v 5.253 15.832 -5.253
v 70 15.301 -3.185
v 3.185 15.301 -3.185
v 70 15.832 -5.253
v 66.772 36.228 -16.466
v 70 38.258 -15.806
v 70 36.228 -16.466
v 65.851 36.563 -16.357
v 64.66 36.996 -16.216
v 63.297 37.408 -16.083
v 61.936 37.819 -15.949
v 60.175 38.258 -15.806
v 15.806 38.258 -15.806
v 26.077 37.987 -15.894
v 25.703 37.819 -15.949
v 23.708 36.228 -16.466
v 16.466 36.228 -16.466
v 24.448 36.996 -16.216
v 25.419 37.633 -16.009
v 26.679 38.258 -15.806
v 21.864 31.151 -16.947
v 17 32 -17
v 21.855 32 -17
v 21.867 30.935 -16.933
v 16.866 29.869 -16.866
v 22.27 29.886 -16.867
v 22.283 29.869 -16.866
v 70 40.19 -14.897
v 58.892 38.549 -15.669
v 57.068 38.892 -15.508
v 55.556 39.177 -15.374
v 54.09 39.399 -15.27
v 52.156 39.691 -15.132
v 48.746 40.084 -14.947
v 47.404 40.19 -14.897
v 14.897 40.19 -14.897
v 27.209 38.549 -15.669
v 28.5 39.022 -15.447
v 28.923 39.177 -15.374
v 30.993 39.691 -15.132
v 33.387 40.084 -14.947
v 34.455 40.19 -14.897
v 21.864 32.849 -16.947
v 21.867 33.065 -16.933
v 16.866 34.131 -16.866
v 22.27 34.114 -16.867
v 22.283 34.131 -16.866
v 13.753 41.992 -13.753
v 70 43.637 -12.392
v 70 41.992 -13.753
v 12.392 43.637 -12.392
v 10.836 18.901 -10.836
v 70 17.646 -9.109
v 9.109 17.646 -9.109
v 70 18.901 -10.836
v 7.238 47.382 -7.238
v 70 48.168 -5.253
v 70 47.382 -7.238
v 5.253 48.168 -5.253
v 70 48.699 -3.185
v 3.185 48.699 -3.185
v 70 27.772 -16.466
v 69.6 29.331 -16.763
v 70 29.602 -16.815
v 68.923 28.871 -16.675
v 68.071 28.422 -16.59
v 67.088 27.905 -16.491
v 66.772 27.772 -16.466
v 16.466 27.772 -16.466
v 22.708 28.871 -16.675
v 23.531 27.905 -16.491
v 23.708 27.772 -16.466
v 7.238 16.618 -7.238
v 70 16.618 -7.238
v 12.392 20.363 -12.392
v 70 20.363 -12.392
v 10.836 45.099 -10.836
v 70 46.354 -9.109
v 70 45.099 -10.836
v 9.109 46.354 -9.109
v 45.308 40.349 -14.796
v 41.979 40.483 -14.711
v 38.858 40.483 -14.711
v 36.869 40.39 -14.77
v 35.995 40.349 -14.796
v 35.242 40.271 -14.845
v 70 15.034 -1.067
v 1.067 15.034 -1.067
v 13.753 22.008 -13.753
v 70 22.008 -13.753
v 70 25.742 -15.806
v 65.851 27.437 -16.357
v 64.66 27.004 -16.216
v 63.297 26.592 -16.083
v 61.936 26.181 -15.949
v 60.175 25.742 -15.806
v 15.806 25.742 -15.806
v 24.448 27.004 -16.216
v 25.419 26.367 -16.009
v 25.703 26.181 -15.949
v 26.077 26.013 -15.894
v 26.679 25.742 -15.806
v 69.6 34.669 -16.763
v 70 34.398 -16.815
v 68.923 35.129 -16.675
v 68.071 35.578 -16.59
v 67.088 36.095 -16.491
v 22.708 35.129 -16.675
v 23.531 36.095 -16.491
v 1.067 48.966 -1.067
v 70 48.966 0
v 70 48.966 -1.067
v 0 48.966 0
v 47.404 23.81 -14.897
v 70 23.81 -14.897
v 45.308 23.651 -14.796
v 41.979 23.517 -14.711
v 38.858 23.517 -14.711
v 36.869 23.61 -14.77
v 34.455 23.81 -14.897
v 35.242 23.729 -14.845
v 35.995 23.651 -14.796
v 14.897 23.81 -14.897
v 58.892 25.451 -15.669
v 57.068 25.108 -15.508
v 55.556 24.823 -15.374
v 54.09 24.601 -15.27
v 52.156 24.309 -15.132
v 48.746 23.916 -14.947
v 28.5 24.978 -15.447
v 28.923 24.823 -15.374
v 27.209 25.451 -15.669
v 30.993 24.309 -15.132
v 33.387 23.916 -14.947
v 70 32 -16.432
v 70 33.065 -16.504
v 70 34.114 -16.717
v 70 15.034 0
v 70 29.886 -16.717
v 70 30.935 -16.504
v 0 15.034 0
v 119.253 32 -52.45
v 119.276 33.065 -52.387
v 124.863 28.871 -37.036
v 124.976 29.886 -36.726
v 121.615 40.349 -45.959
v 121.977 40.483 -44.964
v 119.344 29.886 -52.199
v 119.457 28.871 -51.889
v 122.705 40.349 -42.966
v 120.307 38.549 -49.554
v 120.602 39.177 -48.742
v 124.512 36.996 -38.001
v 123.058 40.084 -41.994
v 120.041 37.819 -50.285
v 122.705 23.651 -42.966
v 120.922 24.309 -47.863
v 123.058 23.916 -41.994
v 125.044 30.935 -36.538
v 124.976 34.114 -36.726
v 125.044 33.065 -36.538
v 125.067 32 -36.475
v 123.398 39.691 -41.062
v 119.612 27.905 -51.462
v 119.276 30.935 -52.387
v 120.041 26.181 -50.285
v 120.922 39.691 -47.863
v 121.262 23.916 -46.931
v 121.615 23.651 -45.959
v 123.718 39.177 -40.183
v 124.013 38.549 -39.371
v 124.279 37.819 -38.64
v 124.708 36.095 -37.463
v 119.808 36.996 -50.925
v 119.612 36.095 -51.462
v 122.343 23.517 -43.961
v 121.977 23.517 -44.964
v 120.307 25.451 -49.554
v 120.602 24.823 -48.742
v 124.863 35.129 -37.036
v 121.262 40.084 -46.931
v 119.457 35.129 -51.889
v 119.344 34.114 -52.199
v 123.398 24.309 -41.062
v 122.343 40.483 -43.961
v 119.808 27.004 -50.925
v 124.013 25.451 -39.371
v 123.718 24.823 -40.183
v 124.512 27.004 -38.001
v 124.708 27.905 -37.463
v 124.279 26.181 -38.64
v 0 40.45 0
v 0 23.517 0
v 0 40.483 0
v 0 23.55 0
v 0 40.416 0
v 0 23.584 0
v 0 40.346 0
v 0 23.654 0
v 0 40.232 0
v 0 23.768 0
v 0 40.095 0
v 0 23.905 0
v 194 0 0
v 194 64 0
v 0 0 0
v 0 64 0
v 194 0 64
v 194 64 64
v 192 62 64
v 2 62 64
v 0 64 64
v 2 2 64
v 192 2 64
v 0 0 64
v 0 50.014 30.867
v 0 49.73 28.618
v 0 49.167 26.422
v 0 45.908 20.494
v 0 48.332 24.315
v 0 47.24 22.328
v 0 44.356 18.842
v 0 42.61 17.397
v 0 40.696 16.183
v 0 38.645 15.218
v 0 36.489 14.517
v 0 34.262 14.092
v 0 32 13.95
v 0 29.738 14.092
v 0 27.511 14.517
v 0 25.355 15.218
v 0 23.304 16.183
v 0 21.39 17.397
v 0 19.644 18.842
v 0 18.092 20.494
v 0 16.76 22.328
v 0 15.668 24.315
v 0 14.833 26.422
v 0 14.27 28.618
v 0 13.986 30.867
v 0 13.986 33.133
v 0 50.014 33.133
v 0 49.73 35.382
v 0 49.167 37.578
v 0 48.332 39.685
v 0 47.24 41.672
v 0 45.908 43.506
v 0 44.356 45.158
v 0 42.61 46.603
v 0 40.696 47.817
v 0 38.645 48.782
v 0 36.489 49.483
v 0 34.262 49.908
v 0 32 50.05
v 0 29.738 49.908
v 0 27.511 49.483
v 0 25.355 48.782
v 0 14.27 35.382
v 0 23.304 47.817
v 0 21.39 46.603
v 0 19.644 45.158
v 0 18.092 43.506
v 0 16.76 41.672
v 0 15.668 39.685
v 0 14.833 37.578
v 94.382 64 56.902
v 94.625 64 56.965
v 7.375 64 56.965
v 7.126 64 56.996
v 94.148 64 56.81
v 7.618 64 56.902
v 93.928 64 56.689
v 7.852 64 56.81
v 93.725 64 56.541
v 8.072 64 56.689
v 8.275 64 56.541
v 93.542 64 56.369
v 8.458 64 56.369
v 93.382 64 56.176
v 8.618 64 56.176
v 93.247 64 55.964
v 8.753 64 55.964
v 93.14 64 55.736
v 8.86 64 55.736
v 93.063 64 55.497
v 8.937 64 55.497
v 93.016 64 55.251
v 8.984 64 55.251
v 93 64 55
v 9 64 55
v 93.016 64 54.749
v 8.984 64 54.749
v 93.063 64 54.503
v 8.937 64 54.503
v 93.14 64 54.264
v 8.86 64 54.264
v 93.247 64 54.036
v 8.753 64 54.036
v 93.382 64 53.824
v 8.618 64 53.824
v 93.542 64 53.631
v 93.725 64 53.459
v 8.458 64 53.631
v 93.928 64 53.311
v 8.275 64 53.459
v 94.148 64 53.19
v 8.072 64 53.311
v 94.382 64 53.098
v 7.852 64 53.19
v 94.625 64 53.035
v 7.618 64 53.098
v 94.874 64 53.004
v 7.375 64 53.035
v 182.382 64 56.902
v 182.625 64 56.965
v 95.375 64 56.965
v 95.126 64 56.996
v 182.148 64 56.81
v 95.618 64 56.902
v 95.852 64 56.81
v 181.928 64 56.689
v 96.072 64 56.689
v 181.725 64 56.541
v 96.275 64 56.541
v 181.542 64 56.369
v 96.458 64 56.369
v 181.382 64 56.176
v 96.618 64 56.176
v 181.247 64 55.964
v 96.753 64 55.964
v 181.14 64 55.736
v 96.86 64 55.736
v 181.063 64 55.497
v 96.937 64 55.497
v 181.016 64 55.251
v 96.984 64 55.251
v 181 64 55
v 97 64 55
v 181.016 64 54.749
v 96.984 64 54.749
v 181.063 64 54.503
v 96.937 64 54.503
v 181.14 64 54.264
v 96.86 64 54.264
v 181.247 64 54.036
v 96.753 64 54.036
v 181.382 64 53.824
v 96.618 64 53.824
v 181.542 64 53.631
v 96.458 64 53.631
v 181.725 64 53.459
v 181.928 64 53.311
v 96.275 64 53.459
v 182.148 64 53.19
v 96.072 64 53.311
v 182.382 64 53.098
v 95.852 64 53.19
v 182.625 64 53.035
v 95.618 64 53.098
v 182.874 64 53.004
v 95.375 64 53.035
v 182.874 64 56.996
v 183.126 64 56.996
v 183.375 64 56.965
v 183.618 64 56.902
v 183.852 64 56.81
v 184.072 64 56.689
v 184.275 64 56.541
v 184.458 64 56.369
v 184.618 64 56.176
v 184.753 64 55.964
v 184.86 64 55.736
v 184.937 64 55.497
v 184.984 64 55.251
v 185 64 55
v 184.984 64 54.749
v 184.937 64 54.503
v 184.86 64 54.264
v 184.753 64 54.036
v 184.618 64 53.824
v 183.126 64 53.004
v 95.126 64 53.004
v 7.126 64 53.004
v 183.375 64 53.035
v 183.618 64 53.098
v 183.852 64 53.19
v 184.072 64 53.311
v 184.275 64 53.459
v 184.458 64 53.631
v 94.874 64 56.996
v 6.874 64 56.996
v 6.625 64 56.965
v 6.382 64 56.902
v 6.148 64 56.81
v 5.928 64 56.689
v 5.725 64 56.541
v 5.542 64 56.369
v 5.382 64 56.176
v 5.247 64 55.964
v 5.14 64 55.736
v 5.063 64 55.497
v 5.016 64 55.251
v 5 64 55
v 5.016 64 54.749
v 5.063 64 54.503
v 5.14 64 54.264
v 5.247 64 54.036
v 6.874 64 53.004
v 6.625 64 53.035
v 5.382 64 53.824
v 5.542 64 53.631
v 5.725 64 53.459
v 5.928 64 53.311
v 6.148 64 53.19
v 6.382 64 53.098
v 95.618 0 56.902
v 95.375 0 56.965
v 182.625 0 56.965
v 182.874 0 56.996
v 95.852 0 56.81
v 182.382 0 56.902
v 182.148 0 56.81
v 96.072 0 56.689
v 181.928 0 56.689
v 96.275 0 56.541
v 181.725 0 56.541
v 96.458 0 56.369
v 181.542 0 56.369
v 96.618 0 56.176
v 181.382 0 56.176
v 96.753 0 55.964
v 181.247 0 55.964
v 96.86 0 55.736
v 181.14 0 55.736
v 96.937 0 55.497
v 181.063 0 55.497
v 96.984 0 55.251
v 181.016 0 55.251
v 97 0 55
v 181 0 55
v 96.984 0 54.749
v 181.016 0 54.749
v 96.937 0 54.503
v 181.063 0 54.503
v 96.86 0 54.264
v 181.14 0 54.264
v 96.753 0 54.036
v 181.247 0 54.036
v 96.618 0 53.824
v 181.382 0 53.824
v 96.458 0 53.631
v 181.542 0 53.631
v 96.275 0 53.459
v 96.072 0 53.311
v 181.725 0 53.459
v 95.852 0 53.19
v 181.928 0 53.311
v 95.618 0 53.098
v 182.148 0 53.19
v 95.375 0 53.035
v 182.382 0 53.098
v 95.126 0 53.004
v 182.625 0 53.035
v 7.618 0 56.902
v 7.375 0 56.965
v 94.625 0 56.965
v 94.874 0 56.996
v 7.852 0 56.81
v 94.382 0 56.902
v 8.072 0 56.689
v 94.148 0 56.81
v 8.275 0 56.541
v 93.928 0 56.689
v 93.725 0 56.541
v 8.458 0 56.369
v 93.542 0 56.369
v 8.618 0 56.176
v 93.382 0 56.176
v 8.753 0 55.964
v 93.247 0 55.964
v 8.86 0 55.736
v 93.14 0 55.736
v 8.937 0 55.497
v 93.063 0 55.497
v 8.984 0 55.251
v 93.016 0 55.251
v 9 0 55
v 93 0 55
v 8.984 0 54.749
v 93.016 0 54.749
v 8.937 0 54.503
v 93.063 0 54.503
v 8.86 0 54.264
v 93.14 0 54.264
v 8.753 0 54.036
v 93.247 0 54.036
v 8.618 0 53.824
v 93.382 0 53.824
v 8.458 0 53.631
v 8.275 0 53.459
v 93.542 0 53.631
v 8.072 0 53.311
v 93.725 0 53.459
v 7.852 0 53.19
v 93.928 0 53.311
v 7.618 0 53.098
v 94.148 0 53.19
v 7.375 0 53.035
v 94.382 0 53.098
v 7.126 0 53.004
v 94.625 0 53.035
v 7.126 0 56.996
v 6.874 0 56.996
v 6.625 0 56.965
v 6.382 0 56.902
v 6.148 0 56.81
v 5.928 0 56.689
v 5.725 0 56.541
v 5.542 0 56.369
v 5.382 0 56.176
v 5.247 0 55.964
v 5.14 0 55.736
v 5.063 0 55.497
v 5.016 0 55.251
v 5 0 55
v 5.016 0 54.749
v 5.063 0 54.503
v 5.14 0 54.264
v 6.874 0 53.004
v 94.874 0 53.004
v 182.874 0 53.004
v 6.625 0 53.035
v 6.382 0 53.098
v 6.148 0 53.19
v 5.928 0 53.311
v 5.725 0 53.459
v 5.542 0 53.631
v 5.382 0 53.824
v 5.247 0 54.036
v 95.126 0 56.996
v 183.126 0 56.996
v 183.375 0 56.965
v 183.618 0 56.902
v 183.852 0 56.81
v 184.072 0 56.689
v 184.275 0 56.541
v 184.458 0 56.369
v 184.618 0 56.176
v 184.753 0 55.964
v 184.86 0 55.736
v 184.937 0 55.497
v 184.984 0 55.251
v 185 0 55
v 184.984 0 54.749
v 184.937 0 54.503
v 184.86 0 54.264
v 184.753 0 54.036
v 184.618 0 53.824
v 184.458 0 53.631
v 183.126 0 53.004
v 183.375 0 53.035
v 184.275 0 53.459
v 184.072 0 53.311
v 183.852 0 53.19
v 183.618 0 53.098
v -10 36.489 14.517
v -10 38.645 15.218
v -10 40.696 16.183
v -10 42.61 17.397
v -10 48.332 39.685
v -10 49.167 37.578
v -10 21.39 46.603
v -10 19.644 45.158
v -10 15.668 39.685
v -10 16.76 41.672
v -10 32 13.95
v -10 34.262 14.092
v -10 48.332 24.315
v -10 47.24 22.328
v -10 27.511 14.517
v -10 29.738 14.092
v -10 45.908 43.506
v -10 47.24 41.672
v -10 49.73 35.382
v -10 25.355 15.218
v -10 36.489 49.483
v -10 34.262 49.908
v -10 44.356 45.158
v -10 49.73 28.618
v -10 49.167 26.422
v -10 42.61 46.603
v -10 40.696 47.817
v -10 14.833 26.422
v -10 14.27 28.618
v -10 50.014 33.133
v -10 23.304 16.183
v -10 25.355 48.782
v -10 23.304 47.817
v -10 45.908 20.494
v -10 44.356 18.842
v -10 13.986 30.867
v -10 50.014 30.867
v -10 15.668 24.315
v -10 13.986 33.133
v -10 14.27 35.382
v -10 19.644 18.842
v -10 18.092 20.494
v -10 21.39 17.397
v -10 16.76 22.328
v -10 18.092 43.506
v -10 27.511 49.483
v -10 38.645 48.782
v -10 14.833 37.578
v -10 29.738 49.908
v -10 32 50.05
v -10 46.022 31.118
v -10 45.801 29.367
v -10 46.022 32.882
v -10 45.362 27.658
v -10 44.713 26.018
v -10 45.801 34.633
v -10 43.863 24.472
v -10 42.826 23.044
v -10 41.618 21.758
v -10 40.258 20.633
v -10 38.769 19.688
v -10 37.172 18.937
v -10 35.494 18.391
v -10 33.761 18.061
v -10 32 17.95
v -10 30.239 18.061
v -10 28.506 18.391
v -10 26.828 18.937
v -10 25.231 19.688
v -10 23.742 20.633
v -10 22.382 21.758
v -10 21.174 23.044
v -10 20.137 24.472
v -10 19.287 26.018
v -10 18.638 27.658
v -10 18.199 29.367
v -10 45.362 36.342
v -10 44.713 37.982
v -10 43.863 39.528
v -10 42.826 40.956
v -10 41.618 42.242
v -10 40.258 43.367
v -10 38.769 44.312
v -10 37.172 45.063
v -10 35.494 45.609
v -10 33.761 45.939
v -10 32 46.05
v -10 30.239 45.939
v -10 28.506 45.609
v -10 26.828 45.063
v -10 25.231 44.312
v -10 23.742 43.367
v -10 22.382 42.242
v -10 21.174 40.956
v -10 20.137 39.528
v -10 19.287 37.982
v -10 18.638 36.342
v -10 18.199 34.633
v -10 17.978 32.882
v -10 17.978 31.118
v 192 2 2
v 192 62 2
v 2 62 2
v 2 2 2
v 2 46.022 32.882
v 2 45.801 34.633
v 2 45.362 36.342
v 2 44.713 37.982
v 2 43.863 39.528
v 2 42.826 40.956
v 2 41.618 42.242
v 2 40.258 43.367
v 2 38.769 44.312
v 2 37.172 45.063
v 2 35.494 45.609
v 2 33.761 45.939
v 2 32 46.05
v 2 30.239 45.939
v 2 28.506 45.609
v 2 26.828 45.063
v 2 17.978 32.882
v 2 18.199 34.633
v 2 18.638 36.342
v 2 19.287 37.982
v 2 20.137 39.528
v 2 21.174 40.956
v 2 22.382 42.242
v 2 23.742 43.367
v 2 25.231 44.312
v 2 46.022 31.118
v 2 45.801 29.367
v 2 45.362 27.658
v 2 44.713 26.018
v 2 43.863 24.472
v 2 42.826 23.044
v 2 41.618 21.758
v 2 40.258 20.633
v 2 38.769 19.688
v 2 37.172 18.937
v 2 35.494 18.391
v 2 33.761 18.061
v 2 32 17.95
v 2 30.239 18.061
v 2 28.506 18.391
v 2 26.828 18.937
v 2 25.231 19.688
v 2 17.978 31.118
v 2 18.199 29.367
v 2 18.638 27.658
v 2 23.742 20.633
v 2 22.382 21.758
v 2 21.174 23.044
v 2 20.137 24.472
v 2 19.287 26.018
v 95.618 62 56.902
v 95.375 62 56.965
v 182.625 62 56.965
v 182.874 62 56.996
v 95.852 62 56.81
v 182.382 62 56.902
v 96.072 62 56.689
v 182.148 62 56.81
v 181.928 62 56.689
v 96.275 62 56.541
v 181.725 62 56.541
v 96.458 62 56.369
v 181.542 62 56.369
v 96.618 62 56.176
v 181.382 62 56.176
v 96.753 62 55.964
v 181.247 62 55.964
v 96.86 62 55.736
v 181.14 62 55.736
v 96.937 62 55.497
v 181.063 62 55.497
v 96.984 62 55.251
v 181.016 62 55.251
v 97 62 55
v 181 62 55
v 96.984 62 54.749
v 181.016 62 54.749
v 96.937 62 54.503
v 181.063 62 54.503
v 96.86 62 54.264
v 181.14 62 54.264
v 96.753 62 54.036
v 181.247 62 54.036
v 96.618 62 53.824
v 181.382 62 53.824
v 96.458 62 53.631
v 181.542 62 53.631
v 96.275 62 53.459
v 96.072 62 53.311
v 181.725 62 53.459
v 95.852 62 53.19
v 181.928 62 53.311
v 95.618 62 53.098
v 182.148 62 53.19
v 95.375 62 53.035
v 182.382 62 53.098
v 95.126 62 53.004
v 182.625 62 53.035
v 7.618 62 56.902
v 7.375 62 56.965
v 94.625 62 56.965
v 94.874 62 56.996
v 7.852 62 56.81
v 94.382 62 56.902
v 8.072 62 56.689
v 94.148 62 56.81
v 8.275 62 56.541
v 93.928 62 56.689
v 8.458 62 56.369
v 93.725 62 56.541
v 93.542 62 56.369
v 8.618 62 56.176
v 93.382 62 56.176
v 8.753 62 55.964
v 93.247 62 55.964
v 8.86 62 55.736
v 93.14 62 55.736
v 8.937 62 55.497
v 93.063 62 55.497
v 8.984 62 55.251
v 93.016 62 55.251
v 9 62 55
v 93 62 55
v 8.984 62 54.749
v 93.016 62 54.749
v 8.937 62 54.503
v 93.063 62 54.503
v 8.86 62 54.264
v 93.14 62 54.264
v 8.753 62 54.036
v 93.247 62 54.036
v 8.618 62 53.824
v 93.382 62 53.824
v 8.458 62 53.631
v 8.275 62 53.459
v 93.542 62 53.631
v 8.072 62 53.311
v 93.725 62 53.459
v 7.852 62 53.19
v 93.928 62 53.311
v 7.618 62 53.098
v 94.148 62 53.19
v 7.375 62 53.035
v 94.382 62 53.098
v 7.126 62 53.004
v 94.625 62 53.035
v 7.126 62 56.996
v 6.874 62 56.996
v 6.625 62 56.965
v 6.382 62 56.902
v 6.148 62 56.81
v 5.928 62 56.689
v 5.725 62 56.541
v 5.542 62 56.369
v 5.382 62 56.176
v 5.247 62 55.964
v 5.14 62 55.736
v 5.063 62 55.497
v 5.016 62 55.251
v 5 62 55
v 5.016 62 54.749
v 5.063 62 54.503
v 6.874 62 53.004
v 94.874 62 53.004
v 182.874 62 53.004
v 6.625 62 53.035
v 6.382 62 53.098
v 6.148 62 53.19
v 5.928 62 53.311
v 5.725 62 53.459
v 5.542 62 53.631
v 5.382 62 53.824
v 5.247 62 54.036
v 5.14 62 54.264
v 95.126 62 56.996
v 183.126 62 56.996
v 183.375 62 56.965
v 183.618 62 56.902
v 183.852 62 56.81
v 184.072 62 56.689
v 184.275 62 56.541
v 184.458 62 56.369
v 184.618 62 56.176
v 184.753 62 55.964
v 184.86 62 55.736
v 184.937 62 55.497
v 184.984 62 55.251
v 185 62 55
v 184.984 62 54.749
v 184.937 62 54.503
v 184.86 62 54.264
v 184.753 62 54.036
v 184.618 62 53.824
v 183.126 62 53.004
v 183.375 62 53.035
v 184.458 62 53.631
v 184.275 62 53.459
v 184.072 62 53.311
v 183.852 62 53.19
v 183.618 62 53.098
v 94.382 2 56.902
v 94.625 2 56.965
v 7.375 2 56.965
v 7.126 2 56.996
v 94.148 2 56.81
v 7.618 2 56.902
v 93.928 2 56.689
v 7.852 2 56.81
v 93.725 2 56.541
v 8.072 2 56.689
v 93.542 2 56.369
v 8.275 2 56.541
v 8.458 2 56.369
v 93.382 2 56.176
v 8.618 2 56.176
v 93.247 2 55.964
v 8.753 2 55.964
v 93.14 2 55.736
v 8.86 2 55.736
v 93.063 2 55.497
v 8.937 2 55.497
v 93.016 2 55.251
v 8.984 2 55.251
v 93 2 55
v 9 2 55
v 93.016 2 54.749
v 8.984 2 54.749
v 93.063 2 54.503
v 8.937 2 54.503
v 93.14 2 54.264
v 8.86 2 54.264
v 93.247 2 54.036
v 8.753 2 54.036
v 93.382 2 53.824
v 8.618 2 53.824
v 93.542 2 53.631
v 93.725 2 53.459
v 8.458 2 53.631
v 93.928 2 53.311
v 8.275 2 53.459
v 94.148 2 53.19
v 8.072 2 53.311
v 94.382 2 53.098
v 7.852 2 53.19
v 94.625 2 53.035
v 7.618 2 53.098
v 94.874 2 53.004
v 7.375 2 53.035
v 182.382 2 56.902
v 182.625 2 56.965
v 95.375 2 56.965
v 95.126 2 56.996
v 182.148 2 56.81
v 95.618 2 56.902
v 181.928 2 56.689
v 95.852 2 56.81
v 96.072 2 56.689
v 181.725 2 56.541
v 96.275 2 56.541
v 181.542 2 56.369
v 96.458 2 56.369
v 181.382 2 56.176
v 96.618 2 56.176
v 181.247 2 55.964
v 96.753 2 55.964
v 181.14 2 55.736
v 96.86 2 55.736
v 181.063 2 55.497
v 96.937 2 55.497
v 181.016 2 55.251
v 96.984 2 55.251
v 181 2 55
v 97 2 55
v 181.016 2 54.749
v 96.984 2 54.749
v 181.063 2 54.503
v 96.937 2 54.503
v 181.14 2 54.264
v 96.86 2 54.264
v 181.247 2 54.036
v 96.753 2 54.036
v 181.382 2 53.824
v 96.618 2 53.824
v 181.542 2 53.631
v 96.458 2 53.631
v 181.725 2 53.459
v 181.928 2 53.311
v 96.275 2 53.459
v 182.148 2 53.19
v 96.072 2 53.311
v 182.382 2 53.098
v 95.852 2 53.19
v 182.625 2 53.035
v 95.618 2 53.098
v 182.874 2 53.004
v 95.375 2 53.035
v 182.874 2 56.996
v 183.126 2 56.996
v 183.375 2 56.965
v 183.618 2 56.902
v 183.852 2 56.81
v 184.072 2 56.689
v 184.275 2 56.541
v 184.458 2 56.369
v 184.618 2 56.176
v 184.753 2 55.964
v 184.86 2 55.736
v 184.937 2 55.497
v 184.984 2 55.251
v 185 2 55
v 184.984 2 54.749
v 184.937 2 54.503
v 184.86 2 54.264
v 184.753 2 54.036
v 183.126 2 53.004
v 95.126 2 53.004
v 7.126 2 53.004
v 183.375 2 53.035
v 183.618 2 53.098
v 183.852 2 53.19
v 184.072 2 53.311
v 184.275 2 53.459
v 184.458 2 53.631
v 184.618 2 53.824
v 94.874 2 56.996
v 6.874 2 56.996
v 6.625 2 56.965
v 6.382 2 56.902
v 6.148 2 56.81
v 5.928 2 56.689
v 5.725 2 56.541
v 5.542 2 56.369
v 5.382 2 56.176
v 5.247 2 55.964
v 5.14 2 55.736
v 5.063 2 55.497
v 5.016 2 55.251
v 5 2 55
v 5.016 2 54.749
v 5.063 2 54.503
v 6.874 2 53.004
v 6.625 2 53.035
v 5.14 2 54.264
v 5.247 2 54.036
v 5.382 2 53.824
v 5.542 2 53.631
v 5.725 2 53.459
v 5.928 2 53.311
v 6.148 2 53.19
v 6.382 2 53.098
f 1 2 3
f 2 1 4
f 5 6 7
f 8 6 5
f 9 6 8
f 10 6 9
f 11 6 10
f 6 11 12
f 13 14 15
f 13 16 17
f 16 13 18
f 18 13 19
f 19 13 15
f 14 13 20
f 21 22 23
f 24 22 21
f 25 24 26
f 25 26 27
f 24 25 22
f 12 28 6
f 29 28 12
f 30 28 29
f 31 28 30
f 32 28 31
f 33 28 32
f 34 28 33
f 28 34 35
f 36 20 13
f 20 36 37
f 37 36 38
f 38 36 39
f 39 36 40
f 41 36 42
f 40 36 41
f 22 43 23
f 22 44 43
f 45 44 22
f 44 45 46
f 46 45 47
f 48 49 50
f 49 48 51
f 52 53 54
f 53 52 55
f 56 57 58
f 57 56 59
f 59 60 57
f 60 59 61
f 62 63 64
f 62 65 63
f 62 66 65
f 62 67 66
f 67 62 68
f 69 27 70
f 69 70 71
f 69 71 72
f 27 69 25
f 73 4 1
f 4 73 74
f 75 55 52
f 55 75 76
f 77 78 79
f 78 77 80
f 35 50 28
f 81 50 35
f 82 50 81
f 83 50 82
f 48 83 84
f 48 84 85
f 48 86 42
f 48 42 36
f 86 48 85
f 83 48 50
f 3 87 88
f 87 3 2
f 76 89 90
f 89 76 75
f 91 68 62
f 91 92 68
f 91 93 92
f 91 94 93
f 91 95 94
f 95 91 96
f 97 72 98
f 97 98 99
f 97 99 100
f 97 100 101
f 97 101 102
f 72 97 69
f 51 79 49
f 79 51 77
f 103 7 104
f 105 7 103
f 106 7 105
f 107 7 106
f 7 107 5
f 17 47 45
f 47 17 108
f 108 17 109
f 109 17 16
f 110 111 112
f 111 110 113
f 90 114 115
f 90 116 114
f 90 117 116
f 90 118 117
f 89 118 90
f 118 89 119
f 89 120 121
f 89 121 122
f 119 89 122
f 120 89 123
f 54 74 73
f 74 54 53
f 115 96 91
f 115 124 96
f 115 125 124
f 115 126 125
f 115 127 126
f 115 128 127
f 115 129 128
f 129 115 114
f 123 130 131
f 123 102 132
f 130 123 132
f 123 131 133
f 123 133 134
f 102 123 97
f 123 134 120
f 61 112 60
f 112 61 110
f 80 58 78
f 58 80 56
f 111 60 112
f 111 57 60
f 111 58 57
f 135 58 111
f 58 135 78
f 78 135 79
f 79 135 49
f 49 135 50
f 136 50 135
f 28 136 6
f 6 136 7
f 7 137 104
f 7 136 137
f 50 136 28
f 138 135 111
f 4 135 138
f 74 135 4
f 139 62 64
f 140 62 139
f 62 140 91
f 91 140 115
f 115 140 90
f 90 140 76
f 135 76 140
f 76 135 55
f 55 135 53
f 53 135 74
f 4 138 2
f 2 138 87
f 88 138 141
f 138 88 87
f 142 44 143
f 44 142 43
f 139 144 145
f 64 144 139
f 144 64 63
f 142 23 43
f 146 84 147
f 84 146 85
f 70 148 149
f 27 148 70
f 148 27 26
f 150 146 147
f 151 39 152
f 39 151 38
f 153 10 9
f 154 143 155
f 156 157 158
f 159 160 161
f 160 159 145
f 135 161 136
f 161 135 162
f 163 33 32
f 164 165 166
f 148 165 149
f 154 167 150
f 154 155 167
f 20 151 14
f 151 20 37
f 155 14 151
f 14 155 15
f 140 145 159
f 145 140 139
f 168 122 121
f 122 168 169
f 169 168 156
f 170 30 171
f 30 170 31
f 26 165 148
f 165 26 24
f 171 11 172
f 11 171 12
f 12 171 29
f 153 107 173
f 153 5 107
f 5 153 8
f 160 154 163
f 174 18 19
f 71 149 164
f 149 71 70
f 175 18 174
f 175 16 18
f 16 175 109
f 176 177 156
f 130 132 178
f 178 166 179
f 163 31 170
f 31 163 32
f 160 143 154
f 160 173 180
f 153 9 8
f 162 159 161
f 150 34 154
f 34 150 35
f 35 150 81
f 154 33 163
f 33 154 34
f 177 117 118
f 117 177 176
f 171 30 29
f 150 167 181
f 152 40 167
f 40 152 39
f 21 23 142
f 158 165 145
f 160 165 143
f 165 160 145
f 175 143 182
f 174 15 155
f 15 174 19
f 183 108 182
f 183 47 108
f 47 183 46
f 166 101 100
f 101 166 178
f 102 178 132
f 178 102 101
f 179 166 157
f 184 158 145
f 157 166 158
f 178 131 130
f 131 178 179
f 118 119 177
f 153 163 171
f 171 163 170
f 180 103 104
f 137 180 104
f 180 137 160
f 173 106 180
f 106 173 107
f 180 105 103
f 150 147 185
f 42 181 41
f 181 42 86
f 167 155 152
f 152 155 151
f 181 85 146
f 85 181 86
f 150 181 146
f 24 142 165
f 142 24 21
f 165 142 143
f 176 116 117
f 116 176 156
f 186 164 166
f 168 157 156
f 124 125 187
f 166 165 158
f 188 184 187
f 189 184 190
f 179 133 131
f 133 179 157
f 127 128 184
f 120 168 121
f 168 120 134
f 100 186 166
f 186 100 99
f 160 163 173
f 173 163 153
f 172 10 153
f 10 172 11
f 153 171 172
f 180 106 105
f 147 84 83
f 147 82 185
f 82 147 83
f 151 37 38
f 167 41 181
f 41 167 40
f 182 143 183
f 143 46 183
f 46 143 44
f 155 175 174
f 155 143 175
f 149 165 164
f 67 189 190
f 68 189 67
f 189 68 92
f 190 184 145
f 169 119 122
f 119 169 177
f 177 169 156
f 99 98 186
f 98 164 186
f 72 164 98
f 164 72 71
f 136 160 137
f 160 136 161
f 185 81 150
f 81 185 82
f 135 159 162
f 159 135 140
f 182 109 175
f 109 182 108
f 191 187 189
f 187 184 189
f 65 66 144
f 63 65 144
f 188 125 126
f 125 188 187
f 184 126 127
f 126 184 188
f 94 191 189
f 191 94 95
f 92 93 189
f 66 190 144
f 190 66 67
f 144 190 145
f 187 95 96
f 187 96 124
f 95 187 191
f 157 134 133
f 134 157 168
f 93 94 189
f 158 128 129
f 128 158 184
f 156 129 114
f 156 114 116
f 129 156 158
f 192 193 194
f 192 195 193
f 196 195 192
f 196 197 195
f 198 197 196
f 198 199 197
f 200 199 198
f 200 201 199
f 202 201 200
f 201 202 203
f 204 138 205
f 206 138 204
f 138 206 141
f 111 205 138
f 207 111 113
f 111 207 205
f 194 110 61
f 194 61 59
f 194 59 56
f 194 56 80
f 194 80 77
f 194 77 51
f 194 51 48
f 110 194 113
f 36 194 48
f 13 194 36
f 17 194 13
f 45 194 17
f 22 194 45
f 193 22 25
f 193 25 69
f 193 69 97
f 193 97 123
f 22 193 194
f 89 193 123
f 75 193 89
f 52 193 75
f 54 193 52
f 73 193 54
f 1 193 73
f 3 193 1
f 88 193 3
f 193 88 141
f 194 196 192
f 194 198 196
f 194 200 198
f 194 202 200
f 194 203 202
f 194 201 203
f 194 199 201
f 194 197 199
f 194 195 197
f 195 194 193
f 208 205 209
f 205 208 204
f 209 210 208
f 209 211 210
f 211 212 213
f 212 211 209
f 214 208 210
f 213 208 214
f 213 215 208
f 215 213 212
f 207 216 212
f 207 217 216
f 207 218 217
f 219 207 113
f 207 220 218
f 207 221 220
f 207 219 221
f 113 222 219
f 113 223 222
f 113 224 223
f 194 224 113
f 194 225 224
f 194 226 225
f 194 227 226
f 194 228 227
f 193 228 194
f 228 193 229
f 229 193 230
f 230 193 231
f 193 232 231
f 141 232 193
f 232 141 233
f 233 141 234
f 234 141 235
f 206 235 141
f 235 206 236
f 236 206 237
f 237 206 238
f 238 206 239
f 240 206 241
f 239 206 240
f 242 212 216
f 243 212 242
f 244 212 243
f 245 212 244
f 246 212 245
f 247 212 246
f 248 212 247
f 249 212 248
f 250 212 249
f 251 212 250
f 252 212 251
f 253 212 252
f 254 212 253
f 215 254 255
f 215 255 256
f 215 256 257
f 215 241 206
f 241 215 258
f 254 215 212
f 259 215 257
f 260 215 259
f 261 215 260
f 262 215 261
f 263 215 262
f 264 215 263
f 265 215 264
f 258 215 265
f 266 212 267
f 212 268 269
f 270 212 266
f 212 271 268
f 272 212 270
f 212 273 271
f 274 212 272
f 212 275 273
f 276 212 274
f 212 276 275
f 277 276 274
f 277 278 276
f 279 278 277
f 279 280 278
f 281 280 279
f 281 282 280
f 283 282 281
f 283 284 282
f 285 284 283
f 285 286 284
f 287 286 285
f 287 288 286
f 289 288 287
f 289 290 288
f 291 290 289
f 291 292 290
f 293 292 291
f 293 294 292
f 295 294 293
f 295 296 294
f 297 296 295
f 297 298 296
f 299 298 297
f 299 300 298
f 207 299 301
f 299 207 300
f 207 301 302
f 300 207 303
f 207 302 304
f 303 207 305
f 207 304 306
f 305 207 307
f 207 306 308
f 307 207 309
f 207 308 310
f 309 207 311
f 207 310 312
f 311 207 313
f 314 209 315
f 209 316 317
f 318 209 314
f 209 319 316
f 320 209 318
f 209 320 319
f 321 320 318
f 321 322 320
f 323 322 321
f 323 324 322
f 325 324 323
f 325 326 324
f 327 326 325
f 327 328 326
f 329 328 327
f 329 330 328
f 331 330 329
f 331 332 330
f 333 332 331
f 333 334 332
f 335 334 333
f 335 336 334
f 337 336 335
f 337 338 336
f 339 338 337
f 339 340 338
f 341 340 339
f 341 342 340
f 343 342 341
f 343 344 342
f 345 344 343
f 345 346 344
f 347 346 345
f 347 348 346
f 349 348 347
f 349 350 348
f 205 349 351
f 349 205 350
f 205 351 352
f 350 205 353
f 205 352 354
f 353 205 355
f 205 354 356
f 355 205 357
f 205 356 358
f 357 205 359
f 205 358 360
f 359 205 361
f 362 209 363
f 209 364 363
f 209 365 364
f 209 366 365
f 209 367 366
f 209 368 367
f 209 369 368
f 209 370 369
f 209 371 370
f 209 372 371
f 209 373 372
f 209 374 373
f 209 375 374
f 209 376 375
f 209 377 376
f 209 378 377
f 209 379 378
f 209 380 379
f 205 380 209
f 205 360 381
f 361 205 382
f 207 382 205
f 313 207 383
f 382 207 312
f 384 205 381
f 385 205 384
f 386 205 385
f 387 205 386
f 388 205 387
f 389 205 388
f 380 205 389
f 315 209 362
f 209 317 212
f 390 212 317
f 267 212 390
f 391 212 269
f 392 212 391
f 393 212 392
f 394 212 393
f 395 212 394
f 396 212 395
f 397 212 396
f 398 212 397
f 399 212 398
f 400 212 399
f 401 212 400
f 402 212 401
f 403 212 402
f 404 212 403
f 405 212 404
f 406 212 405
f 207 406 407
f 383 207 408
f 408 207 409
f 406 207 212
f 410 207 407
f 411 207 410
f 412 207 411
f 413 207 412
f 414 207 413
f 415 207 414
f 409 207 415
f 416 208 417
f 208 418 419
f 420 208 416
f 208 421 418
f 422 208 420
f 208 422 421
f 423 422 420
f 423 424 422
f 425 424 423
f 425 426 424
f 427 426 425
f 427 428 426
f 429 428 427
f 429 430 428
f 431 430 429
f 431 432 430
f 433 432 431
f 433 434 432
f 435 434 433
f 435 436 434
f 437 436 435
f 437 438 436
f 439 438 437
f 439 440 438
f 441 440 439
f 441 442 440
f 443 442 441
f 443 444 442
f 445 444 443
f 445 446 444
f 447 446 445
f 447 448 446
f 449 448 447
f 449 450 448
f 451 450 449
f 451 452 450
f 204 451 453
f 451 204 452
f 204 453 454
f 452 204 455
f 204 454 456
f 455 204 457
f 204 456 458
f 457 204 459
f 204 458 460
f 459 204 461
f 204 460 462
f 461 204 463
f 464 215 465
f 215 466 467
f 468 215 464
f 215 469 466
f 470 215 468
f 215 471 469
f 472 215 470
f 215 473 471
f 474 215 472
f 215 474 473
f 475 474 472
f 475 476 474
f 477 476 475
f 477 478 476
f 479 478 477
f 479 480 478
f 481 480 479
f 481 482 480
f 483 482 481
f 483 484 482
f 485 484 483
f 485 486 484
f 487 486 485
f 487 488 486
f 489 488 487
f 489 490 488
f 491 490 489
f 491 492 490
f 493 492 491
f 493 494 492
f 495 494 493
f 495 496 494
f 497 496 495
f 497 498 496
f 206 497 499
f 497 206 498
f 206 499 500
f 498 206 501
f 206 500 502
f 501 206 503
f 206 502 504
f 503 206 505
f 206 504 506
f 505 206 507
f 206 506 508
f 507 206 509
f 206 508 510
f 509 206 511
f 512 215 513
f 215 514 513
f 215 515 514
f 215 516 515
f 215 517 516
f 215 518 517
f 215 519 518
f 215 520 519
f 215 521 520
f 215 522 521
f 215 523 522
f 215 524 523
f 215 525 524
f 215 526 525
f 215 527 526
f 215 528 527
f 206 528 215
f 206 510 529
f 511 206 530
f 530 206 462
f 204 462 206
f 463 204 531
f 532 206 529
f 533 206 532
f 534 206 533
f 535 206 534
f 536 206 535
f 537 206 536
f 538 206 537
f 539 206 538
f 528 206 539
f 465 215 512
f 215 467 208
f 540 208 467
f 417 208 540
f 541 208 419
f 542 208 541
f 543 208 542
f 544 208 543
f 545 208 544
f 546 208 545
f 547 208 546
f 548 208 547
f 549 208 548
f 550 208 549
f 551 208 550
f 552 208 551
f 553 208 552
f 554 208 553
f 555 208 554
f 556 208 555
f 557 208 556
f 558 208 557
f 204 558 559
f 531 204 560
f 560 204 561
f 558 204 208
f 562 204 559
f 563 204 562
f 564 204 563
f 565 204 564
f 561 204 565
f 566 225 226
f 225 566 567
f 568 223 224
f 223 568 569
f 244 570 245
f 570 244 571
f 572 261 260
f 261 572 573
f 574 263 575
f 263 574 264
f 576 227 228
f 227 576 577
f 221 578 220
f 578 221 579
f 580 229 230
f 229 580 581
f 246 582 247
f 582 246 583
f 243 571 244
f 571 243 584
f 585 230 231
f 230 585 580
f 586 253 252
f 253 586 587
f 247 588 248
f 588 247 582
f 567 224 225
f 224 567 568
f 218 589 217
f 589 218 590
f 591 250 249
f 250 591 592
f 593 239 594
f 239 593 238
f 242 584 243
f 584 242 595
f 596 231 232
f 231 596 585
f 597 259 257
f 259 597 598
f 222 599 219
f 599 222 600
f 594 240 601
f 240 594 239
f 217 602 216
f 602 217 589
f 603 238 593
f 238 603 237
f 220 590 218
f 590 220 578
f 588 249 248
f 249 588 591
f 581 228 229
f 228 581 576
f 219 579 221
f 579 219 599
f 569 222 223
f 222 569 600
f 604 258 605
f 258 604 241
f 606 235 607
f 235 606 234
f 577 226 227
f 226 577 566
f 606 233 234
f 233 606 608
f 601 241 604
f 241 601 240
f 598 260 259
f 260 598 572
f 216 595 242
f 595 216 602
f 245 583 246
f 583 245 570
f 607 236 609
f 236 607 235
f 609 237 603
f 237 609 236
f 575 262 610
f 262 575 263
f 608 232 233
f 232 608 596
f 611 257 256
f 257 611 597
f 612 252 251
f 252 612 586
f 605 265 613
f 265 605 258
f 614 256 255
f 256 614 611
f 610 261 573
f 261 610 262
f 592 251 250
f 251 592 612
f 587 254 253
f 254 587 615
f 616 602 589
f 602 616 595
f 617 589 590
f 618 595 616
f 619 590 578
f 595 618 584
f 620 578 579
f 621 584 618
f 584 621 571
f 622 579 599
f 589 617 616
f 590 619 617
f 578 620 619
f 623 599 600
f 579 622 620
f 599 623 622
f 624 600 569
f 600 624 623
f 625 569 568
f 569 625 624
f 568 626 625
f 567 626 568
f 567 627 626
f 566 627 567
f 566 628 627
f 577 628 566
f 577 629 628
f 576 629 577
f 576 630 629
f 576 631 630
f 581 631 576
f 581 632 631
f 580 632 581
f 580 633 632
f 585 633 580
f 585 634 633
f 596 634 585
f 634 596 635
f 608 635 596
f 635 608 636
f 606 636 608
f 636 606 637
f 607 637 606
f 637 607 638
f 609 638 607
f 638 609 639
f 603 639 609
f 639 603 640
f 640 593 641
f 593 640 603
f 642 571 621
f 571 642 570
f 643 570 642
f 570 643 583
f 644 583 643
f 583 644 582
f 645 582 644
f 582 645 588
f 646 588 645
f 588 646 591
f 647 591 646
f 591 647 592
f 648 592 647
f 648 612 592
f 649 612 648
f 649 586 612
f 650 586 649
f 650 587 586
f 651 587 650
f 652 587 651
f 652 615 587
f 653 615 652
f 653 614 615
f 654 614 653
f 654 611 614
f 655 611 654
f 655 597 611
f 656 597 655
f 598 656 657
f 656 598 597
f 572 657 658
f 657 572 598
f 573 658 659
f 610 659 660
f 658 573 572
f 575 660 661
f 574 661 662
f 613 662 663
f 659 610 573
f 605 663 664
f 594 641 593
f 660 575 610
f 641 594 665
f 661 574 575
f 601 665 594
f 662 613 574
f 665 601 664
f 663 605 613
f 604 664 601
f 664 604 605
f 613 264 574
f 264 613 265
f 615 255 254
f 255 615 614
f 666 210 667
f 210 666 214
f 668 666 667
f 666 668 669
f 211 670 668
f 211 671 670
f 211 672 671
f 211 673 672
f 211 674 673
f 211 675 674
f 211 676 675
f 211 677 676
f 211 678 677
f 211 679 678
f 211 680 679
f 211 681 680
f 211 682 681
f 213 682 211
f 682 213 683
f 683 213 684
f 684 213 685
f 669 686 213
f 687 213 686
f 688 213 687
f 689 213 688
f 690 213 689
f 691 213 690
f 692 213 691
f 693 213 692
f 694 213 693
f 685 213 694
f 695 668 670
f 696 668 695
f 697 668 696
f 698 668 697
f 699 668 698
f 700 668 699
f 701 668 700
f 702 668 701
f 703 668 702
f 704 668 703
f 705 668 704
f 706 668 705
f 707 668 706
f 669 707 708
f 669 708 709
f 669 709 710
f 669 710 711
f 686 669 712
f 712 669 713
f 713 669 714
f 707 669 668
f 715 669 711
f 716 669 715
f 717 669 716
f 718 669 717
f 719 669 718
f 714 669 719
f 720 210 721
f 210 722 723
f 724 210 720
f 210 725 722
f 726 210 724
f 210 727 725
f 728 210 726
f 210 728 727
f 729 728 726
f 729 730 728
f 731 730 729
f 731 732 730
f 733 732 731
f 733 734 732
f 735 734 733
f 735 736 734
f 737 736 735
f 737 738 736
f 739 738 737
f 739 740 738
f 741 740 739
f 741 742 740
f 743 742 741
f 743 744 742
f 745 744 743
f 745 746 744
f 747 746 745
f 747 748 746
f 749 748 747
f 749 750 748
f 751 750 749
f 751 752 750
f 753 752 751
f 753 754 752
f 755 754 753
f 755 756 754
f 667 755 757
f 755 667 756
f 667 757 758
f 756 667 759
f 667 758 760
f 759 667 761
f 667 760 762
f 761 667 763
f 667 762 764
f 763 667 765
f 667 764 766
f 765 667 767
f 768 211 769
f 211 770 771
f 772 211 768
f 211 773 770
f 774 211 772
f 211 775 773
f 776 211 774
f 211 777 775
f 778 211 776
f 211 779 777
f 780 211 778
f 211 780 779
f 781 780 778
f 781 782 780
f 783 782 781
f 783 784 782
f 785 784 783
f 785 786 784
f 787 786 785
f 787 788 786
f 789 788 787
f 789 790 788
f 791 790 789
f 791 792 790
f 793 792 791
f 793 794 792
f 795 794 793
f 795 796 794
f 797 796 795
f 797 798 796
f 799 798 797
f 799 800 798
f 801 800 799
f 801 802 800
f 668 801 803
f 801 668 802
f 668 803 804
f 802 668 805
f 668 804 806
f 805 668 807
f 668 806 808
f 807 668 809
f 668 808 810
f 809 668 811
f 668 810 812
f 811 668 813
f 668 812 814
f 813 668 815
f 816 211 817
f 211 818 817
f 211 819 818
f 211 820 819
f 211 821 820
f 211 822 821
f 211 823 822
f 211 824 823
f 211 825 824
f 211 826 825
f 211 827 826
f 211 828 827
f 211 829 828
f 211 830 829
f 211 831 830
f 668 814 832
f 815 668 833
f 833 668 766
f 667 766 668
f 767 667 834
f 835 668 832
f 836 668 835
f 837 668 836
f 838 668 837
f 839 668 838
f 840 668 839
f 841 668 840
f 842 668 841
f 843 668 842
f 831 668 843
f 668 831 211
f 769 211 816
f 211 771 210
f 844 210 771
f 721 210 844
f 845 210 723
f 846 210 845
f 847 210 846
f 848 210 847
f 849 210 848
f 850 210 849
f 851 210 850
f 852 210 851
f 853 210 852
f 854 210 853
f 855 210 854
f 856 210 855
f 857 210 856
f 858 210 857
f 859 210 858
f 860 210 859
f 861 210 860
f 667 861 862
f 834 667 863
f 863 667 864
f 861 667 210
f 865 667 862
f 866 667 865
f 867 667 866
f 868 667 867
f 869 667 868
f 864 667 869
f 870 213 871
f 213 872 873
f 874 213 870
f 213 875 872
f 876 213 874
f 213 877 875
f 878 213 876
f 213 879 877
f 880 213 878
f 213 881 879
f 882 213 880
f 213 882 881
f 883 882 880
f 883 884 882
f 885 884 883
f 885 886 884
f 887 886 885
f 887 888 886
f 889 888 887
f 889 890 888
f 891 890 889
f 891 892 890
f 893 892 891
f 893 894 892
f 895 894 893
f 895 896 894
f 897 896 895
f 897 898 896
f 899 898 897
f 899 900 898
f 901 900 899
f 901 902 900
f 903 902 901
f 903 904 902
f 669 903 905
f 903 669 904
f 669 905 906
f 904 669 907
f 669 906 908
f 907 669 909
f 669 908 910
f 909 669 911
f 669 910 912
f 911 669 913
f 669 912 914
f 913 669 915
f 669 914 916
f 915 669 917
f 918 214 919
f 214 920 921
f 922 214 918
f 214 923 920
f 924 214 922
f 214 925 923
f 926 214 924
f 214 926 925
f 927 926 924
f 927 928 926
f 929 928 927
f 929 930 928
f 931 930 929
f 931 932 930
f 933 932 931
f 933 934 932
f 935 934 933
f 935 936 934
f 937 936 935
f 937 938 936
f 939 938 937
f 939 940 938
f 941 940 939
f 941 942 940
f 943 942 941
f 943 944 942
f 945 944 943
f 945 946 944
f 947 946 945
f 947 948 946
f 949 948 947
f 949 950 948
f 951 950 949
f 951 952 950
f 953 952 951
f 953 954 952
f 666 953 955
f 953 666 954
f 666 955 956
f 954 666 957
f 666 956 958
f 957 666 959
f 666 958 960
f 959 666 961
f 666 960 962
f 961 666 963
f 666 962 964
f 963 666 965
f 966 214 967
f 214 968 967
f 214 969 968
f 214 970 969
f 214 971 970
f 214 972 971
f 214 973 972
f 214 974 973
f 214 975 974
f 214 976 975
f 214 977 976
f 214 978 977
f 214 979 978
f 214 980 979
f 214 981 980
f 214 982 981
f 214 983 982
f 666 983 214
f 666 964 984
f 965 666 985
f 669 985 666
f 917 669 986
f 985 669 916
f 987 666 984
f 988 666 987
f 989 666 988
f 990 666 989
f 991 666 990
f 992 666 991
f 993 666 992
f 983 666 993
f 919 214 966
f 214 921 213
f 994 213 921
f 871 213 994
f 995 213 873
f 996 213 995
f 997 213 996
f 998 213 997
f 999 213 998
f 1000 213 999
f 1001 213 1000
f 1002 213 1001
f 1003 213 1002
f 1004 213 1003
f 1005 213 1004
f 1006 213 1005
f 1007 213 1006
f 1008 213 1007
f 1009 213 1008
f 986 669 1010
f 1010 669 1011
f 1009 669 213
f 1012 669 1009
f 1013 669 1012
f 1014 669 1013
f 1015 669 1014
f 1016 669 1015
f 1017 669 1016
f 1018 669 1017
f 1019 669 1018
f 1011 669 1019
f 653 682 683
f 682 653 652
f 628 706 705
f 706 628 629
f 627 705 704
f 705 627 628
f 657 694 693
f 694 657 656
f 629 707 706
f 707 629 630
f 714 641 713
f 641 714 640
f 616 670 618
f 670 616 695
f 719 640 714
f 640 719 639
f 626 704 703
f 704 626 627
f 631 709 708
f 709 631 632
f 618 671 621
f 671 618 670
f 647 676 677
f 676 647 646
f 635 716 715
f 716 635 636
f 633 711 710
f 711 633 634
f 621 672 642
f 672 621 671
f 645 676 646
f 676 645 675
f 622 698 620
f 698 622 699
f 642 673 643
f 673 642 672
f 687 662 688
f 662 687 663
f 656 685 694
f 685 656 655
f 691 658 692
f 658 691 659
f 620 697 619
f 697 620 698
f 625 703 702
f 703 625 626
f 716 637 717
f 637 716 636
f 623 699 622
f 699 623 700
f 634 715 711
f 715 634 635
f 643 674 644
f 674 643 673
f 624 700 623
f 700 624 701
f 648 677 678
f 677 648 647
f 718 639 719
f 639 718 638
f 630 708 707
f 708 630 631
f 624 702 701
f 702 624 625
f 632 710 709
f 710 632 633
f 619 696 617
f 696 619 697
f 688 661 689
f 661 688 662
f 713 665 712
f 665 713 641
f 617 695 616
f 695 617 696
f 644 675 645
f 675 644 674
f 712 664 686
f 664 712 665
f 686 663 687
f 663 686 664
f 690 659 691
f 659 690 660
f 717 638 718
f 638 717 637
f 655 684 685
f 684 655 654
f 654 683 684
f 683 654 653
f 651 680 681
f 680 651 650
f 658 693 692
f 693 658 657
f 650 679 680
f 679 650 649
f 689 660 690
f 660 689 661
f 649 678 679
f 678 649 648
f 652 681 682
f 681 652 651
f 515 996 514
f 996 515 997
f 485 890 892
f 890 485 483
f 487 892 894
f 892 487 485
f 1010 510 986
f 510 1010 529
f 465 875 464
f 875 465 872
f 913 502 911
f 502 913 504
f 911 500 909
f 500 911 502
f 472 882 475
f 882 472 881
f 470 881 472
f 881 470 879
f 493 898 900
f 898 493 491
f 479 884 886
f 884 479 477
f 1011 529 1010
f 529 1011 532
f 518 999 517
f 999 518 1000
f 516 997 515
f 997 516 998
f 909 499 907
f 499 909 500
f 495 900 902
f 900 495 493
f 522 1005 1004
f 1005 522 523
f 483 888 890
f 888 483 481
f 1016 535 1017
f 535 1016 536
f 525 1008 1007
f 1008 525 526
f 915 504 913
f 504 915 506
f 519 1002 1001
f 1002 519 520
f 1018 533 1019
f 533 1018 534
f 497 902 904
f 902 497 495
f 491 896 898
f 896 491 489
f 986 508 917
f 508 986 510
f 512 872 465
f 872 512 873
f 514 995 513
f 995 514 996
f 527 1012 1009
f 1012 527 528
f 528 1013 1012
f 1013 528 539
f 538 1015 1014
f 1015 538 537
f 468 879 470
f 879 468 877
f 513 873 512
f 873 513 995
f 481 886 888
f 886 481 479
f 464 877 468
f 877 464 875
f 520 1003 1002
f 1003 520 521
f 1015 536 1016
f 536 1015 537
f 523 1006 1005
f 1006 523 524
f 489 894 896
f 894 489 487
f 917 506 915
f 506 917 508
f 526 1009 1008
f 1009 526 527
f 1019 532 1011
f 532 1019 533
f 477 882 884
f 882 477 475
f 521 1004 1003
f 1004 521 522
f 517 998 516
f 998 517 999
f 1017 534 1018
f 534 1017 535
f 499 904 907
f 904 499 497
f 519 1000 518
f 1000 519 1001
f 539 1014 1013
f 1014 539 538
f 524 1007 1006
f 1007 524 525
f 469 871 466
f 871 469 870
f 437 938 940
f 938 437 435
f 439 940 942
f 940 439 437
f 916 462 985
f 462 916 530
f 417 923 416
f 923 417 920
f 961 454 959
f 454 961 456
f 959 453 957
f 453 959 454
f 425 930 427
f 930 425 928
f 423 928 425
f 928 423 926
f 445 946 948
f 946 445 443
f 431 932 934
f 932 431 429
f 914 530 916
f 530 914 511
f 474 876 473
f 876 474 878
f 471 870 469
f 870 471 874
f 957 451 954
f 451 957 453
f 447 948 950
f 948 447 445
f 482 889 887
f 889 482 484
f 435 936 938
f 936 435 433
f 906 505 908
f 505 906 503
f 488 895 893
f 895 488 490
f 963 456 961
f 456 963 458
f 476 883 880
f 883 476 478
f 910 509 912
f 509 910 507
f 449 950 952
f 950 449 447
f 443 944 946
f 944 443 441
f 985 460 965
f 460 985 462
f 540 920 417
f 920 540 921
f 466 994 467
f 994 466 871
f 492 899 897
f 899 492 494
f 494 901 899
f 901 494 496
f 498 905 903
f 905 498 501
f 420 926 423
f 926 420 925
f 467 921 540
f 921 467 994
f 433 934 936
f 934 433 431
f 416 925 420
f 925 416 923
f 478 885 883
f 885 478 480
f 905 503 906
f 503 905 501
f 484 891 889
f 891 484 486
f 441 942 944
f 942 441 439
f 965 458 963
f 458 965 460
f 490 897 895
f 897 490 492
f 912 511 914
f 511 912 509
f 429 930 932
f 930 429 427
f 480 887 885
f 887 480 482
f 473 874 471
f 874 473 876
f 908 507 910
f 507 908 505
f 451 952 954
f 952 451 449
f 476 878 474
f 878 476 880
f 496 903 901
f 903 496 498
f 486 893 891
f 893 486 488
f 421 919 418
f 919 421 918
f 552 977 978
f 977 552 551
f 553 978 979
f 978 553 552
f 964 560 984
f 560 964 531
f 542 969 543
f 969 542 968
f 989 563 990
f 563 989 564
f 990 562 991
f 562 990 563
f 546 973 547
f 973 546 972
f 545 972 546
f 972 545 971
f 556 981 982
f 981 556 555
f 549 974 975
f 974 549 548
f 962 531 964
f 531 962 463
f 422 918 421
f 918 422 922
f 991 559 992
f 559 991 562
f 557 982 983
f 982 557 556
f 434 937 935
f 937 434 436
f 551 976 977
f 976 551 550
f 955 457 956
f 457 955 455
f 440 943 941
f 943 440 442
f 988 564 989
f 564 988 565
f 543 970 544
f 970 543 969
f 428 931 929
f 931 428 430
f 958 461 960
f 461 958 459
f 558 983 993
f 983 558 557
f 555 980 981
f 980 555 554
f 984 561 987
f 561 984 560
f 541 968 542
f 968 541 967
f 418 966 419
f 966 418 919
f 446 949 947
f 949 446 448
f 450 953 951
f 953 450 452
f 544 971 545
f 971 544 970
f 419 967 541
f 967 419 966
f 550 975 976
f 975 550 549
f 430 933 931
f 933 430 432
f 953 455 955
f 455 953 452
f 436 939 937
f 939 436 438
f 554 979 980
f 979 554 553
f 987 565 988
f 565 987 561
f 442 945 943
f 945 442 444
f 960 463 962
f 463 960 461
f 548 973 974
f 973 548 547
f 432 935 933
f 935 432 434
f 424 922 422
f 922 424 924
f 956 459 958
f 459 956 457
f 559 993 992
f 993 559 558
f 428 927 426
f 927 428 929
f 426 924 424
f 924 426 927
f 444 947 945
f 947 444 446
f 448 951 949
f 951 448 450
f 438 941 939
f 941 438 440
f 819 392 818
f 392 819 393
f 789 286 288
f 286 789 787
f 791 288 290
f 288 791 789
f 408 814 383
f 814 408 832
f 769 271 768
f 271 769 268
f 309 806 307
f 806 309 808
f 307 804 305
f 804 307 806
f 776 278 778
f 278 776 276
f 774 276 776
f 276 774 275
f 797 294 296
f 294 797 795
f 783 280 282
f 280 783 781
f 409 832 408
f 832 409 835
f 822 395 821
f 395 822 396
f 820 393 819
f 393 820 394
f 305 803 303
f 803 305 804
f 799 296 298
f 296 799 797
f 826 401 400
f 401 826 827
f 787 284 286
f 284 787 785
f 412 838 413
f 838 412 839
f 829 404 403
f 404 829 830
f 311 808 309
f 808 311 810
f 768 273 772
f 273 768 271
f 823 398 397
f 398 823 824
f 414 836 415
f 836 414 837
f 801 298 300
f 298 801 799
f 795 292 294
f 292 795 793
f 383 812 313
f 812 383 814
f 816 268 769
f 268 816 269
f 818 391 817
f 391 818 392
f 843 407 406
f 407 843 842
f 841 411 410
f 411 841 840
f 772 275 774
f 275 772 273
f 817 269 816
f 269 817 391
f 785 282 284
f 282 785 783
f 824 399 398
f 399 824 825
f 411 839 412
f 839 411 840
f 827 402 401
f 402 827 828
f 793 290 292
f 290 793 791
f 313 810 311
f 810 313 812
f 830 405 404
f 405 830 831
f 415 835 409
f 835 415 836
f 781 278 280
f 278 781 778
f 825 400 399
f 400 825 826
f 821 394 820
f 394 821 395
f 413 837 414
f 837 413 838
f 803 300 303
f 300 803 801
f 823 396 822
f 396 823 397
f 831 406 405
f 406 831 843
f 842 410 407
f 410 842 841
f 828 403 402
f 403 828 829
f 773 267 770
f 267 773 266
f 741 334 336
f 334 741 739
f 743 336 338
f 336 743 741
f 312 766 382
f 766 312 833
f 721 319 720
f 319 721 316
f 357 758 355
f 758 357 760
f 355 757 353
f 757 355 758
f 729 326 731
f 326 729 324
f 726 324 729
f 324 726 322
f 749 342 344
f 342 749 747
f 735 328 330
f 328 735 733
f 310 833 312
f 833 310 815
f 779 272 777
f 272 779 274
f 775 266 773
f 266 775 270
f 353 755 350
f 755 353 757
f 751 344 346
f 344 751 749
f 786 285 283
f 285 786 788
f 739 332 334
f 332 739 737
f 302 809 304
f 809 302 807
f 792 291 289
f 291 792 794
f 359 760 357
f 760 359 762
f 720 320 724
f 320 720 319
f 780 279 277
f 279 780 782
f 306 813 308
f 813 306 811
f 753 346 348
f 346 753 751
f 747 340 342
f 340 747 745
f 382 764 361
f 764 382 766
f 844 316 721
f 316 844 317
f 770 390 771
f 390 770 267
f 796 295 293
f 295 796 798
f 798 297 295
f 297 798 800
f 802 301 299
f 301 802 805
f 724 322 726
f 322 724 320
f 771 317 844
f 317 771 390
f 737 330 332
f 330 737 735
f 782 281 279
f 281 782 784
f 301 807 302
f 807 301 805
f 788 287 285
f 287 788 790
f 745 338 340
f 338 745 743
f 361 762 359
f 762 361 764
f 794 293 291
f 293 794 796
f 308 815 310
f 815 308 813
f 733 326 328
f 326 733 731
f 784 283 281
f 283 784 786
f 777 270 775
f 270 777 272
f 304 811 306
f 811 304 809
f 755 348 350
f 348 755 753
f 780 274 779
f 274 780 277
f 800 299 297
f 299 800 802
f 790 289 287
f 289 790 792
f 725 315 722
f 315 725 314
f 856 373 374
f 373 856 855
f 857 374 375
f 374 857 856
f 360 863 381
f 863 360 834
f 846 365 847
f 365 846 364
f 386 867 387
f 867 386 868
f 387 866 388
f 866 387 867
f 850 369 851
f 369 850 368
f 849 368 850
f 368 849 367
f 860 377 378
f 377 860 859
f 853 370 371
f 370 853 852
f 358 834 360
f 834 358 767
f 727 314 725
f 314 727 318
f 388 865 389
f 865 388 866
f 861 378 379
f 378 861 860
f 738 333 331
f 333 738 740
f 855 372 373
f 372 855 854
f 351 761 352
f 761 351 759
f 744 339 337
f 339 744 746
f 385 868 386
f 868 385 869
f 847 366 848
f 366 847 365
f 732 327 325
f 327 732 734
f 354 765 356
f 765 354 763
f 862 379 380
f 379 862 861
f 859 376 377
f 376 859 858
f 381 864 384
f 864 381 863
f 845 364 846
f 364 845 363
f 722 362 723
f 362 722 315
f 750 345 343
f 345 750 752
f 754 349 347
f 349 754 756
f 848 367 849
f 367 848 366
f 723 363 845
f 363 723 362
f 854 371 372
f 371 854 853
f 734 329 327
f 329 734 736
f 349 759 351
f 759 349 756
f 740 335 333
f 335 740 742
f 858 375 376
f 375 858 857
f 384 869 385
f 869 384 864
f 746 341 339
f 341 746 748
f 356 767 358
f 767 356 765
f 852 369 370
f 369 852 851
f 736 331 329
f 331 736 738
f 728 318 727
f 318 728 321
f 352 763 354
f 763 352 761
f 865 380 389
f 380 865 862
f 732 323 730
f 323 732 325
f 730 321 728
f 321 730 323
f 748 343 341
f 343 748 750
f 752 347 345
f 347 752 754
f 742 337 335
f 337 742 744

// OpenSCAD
$fn = 50;

// The inner size of the box
cm_width = 190;
cm_depth = 60;
cm_height = 60;
cm_thickness = 2;
cm_coh = 28.1; // The cable outlet hole
cm_coh_length = 10;
cm_led_mount = 17;


// st = Stick thickness;
// md = Mount depth; 
// mw = Mount width;
module panel_mount(st, md, mw) {
    difference() {
        
        union() {
            // Reinforcement cylinder for the panel mount
            translate([0, , -0])
            rotate([0,  90, 0])
            cylinder(h = mw, r = st);

            // cylinder for the panel mount
            translate([0, 0, -0])
            rotate([0,  110, 0])
            cylinder(h = 130, r = st / 2);
        }
        
        color("red")
        translate([-1, - st * 2 / 2 - 1, 0])
        cube([mw + 2, st * 2 + 2, st + 2]);

        //d = a * sqrt( 2 )
        // Bevel for the reinforcement cylinder for the panel mount
        color("red")
        translate([-(md * sqrt(2)) / 2, -(md * sqrt(2)) / 2, -(md * sqrt(2)) / 2])
        rotate([0,  45, 0])
        cube([md, md, md]);   

    }
}

difference() {
    
    union() {
        // The box
        cube([cm_width + cm_thickness * 2, cm_depth + cm_thickness * 2, cm_height + cm_thickness * 2]);

        // The outer ring of cable outlot hole
        translate([-cm_coh_length, cm_depth / 2 + cm_thickness, cm_height / 2 + cm_thickness])
        rotate([0,  90, 0])
        cylinder(h=cm_coh_length + cm_thickness, r=cm_coh / 2 + cm_thickness * 2);

        translate([0, cm_depth / 2 + cm_thickness, 0])
        panel_mount(cm_led_mount, cm_depth, 70);
    }
    
    // The inner range of the box
    translate([cm_thickness, cm_thickness, cm_thickness])
    cube([cm_width, cm_depth, cm_height + cm_thickness + 1]);

    // The cable outlet hole
    translate([-cm_coh_length - 1, cm_depth / 2 + cm_thickness, cm_height / 2 + cm_thickness])
    rotate([0, 90, 0])
    cylinder(h = cm_coh_length + cm_thickness + 2, r = cm_coh / 2);

    // The screw holes for the mounting screws (front left)
    color("red")
    translate([cm_thickness + 5, 1 + cm_thickness, cm_height - 5])
    rotate([90, 0, 0])
    cylinder(h = cm_thickness * 2, r = 2);

    // The screw holes for the mounting screws (front middle)
    color("red")
    translate([cm_width /2, 1 + cm_thickness, cm_height - 5])
    rotate([90, 0, 0])
    cylinder(h = cm_thickness * 2, r = 2);

    // The screw holes for the mounting screws (front right)
    color("red")
    translate([cm_width - cm_thickness - 5, 1 + cm_thickness, cm_height - 5])
    rotate([90, 0, 0])
    cylinder(h = cm_thickness * 2, r = 2);

    // The screw holes for the mounting screws (rear left)
    color("red")
    translate([cm_thickness + 5, cm_depth + 1 + cm_thickness * 2, cm_height - 5])
    rotate([90, 0, 0])
    cylinder(h = cm_thickness * 2, r = 2);

    // The screw holes for the mounting screws (rear middle)
    color("red")
    translate([cm_width /2, cm_depth + 1 + cm_thickness * 2, cm_height - 5])
    rotate([90, 0, 0])
    cylinder(h = cm_thickness * 2, r = 2);

    // The screw holes for the mounting screws (rear right)
    color("red")
    translate([cm_width - cm_thickness - 5, cm_depth + 1 + cm_thickness * 2, cm_height - 5])
    rotate([90, 0, 0])
    cylinder(h = cm_thickness * 2, r = 2);

}
